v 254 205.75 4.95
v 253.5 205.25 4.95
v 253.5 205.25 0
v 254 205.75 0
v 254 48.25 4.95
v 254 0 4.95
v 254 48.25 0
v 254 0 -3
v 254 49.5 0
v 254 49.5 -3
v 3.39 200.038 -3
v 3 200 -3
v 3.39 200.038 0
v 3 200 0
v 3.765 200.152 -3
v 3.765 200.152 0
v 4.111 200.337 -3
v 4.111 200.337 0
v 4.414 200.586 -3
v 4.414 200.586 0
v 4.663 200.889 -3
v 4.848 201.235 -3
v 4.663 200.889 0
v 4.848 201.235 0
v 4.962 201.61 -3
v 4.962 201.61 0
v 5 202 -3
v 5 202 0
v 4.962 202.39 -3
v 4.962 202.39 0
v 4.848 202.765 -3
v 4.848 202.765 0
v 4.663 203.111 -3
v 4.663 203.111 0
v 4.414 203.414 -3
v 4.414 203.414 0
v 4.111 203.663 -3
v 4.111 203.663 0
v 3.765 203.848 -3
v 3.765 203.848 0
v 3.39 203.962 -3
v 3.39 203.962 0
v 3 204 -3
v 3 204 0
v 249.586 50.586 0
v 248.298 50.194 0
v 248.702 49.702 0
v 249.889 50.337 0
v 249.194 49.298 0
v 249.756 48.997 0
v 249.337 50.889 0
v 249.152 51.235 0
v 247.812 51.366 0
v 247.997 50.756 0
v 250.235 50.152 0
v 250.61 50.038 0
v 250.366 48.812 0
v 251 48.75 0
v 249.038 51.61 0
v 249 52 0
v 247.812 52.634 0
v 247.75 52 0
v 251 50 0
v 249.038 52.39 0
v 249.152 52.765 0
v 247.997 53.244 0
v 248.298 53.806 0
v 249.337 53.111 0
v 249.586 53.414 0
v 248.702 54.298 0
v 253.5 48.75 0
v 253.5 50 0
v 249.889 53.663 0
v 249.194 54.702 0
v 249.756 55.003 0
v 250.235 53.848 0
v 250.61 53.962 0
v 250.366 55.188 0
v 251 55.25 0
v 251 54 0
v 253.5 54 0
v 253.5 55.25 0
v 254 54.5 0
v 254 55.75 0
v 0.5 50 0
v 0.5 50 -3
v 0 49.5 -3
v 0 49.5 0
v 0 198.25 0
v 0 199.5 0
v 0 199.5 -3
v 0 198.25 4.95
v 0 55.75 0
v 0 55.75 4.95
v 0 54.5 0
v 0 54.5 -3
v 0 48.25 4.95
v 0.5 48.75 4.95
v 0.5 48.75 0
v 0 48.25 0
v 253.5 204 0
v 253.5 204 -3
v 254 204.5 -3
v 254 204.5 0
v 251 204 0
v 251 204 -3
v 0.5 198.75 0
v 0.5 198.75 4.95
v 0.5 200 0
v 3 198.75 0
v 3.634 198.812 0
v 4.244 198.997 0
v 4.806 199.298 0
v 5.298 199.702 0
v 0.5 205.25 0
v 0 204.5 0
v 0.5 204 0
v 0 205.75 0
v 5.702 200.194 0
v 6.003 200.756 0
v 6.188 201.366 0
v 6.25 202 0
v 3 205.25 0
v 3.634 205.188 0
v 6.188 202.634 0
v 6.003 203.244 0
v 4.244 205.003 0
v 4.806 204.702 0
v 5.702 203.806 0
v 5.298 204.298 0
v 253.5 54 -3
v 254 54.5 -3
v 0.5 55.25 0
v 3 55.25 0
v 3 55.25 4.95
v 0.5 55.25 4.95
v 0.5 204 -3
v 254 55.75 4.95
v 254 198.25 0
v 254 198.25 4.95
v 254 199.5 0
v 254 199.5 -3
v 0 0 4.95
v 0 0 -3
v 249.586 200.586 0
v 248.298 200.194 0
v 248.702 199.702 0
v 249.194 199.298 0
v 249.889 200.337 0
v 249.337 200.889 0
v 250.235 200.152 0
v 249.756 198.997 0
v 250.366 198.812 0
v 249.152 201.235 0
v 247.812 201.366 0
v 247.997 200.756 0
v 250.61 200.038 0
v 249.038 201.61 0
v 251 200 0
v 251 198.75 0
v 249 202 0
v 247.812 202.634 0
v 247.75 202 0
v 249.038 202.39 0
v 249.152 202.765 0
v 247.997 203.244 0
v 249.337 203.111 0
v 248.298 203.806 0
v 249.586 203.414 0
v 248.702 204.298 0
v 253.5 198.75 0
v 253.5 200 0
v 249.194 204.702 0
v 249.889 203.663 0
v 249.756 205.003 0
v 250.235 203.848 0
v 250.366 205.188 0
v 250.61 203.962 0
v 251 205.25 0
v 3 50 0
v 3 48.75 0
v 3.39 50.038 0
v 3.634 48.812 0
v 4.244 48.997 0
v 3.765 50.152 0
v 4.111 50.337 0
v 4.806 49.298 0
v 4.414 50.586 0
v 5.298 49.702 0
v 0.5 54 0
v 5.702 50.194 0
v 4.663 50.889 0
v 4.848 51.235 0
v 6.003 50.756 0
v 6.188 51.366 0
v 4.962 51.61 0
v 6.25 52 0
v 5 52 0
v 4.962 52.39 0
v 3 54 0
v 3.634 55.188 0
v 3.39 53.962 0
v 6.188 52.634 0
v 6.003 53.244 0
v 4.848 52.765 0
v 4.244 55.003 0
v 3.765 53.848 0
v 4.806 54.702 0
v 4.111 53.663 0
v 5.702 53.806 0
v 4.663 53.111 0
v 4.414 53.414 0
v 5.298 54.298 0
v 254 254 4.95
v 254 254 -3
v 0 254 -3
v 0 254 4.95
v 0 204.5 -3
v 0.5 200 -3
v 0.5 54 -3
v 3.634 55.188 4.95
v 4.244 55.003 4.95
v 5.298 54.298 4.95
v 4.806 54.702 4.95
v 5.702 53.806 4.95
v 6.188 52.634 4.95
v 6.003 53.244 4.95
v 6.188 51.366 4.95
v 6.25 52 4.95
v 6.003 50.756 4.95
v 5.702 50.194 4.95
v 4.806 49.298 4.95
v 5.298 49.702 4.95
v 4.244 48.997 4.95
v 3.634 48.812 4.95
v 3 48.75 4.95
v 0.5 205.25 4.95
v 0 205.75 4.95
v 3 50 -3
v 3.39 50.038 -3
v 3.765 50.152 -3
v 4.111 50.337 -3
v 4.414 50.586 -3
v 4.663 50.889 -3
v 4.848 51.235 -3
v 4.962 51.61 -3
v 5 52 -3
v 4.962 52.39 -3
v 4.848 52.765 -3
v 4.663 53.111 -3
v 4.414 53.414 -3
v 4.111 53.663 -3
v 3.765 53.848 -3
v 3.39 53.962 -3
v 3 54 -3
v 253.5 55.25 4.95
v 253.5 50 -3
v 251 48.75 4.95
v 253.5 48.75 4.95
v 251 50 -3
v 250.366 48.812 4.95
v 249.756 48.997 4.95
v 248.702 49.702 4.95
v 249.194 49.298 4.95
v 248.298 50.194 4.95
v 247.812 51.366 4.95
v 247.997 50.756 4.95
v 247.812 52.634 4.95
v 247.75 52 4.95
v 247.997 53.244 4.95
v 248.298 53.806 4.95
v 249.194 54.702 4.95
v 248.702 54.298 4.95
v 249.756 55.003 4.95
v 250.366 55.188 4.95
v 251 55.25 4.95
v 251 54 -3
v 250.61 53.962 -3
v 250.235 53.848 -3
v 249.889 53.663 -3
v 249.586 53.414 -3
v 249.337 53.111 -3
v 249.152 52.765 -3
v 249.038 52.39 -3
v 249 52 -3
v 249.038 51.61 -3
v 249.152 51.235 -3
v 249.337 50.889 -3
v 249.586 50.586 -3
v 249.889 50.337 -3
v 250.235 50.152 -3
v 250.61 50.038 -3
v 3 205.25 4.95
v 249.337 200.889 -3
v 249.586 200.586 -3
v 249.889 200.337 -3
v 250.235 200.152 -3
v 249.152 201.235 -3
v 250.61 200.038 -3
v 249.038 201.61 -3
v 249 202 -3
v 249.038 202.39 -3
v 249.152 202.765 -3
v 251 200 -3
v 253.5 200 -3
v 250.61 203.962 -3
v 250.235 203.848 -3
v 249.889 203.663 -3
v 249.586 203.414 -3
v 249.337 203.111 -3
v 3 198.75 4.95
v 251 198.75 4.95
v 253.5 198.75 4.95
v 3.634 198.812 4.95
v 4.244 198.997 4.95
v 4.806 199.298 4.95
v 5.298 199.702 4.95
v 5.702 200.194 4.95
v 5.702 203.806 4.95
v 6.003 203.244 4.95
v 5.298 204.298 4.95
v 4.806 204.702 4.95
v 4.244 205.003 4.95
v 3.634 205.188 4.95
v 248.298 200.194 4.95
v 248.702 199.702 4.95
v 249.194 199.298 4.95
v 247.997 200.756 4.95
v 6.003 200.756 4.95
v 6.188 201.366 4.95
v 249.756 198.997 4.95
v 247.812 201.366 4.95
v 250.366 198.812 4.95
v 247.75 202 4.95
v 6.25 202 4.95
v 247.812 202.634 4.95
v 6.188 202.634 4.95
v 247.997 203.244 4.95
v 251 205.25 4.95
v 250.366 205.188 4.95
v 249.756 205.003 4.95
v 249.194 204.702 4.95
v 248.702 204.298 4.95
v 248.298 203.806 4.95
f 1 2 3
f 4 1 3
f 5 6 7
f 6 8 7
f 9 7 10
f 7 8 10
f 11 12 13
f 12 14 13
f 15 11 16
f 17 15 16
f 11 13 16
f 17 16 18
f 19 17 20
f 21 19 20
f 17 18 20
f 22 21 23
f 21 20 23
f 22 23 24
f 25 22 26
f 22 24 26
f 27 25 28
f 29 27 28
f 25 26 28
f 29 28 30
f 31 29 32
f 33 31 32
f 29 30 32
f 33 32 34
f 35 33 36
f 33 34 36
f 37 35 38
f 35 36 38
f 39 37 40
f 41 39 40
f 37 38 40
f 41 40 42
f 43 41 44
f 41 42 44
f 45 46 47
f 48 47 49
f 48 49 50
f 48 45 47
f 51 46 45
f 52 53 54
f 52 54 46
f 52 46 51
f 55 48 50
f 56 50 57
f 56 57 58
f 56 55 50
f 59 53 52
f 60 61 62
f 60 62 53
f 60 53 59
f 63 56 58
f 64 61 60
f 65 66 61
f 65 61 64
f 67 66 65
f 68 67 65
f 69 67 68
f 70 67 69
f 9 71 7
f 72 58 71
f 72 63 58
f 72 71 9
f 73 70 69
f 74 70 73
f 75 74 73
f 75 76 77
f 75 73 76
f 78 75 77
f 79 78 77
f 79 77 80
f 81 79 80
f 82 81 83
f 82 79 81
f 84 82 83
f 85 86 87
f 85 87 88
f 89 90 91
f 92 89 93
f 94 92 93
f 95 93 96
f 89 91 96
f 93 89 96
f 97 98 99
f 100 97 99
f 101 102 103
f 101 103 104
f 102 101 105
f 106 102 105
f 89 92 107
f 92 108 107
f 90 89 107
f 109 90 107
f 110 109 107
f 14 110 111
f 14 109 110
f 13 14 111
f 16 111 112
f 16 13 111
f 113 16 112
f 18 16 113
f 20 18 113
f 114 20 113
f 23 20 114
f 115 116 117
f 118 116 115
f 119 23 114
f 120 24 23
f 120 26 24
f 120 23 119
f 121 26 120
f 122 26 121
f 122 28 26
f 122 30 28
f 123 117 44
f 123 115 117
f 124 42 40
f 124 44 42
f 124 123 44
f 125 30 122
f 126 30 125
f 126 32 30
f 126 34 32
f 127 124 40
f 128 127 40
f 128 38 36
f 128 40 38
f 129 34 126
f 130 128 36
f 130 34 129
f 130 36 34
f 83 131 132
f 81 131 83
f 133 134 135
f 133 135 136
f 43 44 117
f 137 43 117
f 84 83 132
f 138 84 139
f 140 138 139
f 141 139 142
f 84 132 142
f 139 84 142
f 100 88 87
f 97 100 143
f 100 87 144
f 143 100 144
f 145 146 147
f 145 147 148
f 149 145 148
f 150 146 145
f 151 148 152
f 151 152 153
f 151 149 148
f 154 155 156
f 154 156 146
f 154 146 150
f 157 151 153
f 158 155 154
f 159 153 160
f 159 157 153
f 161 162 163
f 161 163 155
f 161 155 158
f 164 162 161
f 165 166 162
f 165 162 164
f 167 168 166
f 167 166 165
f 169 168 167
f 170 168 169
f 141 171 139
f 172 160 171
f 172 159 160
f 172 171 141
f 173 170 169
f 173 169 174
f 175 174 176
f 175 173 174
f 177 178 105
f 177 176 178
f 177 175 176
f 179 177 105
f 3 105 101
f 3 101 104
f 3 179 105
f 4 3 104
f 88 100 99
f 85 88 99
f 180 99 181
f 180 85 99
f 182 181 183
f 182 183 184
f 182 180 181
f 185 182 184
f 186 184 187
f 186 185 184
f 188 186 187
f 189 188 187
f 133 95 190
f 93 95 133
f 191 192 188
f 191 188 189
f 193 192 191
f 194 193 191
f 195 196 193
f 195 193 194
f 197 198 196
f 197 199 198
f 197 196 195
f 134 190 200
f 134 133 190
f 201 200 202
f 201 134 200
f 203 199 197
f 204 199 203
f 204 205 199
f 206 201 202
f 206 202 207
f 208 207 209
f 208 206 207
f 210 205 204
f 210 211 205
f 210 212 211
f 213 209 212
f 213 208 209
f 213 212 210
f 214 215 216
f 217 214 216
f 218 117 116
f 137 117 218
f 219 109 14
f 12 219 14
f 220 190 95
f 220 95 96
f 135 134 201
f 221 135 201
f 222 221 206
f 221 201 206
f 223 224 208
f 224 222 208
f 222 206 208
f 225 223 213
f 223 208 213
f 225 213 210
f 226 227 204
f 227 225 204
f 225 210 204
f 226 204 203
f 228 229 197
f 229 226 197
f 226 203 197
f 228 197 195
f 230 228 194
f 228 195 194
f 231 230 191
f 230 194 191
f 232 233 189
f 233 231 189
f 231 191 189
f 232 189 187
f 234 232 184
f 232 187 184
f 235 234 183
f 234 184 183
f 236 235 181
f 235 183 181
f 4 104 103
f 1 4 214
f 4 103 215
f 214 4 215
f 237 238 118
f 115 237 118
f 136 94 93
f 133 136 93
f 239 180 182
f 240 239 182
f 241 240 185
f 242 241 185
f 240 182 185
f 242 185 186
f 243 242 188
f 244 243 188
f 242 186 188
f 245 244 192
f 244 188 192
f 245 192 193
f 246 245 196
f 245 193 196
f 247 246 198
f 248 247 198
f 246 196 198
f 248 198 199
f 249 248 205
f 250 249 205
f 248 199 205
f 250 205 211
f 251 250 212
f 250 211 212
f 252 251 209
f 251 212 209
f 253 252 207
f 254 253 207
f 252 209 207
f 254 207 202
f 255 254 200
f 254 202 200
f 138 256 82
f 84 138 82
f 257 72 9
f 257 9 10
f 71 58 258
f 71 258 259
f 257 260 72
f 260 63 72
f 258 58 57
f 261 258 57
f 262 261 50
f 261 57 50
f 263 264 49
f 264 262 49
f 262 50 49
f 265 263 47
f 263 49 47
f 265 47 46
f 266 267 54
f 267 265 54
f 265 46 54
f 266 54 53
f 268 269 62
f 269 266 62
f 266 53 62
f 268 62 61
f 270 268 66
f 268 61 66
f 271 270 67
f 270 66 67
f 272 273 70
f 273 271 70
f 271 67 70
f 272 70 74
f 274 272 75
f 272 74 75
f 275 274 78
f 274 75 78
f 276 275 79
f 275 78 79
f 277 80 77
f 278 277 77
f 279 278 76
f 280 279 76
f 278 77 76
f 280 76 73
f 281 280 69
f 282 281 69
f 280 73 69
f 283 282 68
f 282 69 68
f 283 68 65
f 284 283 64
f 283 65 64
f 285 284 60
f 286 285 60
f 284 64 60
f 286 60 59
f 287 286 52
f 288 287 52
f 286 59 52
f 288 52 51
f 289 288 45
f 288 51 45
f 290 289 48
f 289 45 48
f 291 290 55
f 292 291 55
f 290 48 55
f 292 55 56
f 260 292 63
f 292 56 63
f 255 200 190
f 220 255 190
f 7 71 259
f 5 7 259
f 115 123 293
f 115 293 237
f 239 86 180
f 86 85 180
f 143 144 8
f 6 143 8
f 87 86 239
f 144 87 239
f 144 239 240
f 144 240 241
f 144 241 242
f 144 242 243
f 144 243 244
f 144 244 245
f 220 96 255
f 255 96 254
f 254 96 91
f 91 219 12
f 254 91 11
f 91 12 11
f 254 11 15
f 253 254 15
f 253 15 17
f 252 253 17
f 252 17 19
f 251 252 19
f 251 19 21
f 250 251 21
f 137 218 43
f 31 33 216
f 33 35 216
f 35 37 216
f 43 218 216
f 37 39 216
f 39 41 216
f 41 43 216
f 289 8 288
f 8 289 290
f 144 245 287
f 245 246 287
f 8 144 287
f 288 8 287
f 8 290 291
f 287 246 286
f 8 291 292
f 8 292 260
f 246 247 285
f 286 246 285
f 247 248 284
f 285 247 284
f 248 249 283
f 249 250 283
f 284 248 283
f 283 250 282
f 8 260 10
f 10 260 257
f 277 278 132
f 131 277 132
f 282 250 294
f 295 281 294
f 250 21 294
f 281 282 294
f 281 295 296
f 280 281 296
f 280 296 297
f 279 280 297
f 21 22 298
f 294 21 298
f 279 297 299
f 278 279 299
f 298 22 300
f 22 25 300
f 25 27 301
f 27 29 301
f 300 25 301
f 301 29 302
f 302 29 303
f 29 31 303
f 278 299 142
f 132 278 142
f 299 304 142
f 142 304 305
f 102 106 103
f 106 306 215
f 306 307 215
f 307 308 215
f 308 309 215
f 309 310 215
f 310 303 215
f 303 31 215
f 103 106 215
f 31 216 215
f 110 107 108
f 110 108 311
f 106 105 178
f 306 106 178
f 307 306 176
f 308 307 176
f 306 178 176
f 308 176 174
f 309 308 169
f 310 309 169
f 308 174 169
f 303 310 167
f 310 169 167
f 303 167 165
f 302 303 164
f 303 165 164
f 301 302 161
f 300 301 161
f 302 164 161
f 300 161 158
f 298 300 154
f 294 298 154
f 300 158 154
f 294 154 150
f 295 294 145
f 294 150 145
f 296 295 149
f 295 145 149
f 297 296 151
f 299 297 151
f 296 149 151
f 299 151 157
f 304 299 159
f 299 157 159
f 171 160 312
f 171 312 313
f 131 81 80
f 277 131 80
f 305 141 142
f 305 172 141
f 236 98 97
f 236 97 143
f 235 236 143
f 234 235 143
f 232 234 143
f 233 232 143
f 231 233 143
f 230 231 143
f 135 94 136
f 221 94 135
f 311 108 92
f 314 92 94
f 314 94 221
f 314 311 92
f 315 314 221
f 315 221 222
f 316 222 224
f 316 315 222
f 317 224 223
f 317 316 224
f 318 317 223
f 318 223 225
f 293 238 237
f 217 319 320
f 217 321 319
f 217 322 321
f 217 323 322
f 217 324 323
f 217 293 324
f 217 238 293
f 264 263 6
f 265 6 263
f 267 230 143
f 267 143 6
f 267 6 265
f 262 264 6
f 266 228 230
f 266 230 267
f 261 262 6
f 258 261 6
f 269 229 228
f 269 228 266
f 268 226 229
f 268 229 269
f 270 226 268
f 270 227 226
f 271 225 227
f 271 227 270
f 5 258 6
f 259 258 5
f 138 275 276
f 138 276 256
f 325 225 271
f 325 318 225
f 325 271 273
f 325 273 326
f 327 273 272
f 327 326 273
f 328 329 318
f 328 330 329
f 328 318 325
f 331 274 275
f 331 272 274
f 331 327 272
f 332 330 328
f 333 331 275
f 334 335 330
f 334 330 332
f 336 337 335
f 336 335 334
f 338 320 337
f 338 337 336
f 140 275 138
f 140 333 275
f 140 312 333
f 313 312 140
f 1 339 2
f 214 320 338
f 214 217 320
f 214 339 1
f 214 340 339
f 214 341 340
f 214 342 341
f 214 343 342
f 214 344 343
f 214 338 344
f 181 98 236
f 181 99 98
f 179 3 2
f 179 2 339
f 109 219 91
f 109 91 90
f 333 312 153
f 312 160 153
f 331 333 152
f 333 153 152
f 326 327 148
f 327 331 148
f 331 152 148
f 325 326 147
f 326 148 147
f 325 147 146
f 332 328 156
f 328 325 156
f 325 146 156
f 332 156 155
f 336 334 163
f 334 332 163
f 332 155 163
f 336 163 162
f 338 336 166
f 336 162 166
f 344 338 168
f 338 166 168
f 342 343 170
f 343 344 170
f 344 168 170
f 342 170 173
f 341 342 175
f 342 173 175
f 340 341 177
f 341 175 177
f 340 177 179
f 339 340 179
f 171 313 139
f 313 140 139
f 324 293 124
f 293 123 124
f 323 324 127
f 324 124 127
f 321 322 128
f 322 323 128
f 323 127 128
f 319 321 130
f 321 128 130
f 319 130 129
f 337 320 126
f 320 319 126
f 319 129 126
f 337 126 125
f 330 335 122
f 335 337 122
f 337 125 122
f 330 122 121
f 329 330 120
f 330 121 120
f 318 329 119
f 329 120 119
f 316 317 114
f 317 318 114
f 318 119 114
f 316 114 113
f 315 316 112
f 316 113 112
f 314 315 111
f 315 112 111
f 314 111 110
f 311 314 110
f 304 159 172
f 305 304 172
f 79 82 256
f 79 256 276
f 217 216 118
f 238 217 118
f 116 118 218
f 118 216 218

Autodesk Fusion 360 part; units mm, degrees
sketch "Sketch1" plane through (0, 0, 0) normal (0, 0, 1) x (1, 0, 0)
  line L0 (0, 0) -> (254, 0)
  line L1 (254, 0) -> (254, 254)
  line L2 (254, 254) -> (0, 254)
  line L3 (0, 254) -> (0, 0)
  line L4 (0, 127) -> (254, 127) construction
  line L5 (251, 200) -> (254, 200)
  line L6 (254, 204) -> (251, 204)
  arc A0 (251, 204) -> (251, 200) centre (251, 202) ccw
  line L7 (251, 202) -> (275, 202) construction
  line L8 (251, 50) -> (254, 50)
  line L9 (254, 54) -> (251, 54)
  arc A1 (251, 54) -> (251, 50) centre (251, 52) ccw
  line L10 (251, 52) -> (254, 52) construction
  line L11 (3, 204) -> (0, 204)
  line L12 (0, 200) -> (3, 200)
  arc A2 (3, 200) -> (3, 204) centre (3, 202) ccw
  line L13 (3, 202) -> (0, 202) construction
  line L14 (254, 205.25) -> (251, 205.25)
  arc A3 (251, 205.25) -> (251, 198.75) centre (251, 202) ccw
  line L15 (251, 198.75) -> (254, 198.75)
  line L16 (254, 55.25) -> (251, 55.25)
  arc A4 (251, 55.25) -> (251, 48.75) centre (251, 52) ccw
  line L17 (251, 48.75) -> (254, 48.75)
  line L18 (0, 198.75) -> (3, 198.75)
  arc A5 (3, 198.75) -> (3, 205.25) centre (3, 202) ccw
  line L19 (3, 205.25) -> (0, 205.25)
  line L20 (3, 54) -> (0, 54)
  line L21 (0, 50) -> (3, 50)
  arc A6 (3, 50) -> (3, 54) centre (3, 52) ccw
  line L22 (3, 52) -> (0, 52) construction
  line L23 (0, 48.75) -> (3, 48.75)
  arc A7 (3, 48.75) -> (3, 55.25) centre (3, 52) ccw
  line L24 (3, 55.25) -> (0, 55.25)
  point P0 (251, 202)
  point P1 (251, 52)
  point P2 (3, 52)
  point P3 (3, 202)
  dimension "d3" = 254
  dimension "d4" = 254
  dimension "d8" = 3
  dimension "d9" = 3
  dimension "d10" = 75
  dimension "d11" = 75
  dimension "d12" = 2
  dimension "d13" = 2
  dimension "d15" = 3
  dimension "d16" = 75
  dimension "d19" = 2
  dimension "d20" = 1.25
  dimension "d21" = 1.25
  dimension "d22" = 1.25
  dimension "d94" = 127
  dimension "d95" = 3
  dimension "d96" = 2
  dimension "d97" = 75
  dimension "d98" = 1.25
extrude "Extrude2" add sketch "Sketch1" along normal blind 4.95 contours L0 L1 L2 L3 L14 A3 L15 L16 A4 L17 L18 A5 L19 L23 A7 L24
extrude "Extrude3" add sketch "Sketch1" against normal blind 3 contours L0 L1 L2 L3 L14 A3 L15 L16 A4 L17 L18 A5 L19 L23 A7 L24 | L3 L20 L21 A6 L23 A7 L24 | L1 L8 L9 A1 L16 A4 L17 | L3 L11 L12 A2 L18 A5 L19 | L1 L5 L6 A0 L14 A3 L15
chamfer "Chamfer6" distance 0.5 angle 45 16 edges at (0, 205.25, 2.475) (0, 198.75, 2.475) (0, 204, -1.5) (0, 200, -1.5) (0, 55.25, 2.475) (0, 48.75, 2.475) (0, 50, -1.5) (0, 54, -1.5) (254, 48.75, 2.475) (254, 55.25, 2.475) (254, 54, -1.5) (254, 50, -1.5) (254, 205.25, 2.475) (254, 198.75, 2.475) (254, 200, -1.5) (254, 204, -1.5)
equation "x_bed_size = 10 in"
equation "y_bed_size = 10 in"
equation "d3 = x_bed_size"
equation "d4 = y_bed_size"
equation "d8 = d9"
equation "d10 = ( 150 / 2 ) * 1 mm"
equation "d11 = d10"
equation "d12 = d13"
equation "d15 = d9"
equation "d16 = d10"
equation "d19 = d13"
equation "d21 = d20"
equation "d22 = d20"
equation "d23 = 7.95 mm - 3 mm"
equation "d94 = y_bed_size / 2"
equation "d95 = d15"
equation "d96 = d19"
equation "d97 = d16"
